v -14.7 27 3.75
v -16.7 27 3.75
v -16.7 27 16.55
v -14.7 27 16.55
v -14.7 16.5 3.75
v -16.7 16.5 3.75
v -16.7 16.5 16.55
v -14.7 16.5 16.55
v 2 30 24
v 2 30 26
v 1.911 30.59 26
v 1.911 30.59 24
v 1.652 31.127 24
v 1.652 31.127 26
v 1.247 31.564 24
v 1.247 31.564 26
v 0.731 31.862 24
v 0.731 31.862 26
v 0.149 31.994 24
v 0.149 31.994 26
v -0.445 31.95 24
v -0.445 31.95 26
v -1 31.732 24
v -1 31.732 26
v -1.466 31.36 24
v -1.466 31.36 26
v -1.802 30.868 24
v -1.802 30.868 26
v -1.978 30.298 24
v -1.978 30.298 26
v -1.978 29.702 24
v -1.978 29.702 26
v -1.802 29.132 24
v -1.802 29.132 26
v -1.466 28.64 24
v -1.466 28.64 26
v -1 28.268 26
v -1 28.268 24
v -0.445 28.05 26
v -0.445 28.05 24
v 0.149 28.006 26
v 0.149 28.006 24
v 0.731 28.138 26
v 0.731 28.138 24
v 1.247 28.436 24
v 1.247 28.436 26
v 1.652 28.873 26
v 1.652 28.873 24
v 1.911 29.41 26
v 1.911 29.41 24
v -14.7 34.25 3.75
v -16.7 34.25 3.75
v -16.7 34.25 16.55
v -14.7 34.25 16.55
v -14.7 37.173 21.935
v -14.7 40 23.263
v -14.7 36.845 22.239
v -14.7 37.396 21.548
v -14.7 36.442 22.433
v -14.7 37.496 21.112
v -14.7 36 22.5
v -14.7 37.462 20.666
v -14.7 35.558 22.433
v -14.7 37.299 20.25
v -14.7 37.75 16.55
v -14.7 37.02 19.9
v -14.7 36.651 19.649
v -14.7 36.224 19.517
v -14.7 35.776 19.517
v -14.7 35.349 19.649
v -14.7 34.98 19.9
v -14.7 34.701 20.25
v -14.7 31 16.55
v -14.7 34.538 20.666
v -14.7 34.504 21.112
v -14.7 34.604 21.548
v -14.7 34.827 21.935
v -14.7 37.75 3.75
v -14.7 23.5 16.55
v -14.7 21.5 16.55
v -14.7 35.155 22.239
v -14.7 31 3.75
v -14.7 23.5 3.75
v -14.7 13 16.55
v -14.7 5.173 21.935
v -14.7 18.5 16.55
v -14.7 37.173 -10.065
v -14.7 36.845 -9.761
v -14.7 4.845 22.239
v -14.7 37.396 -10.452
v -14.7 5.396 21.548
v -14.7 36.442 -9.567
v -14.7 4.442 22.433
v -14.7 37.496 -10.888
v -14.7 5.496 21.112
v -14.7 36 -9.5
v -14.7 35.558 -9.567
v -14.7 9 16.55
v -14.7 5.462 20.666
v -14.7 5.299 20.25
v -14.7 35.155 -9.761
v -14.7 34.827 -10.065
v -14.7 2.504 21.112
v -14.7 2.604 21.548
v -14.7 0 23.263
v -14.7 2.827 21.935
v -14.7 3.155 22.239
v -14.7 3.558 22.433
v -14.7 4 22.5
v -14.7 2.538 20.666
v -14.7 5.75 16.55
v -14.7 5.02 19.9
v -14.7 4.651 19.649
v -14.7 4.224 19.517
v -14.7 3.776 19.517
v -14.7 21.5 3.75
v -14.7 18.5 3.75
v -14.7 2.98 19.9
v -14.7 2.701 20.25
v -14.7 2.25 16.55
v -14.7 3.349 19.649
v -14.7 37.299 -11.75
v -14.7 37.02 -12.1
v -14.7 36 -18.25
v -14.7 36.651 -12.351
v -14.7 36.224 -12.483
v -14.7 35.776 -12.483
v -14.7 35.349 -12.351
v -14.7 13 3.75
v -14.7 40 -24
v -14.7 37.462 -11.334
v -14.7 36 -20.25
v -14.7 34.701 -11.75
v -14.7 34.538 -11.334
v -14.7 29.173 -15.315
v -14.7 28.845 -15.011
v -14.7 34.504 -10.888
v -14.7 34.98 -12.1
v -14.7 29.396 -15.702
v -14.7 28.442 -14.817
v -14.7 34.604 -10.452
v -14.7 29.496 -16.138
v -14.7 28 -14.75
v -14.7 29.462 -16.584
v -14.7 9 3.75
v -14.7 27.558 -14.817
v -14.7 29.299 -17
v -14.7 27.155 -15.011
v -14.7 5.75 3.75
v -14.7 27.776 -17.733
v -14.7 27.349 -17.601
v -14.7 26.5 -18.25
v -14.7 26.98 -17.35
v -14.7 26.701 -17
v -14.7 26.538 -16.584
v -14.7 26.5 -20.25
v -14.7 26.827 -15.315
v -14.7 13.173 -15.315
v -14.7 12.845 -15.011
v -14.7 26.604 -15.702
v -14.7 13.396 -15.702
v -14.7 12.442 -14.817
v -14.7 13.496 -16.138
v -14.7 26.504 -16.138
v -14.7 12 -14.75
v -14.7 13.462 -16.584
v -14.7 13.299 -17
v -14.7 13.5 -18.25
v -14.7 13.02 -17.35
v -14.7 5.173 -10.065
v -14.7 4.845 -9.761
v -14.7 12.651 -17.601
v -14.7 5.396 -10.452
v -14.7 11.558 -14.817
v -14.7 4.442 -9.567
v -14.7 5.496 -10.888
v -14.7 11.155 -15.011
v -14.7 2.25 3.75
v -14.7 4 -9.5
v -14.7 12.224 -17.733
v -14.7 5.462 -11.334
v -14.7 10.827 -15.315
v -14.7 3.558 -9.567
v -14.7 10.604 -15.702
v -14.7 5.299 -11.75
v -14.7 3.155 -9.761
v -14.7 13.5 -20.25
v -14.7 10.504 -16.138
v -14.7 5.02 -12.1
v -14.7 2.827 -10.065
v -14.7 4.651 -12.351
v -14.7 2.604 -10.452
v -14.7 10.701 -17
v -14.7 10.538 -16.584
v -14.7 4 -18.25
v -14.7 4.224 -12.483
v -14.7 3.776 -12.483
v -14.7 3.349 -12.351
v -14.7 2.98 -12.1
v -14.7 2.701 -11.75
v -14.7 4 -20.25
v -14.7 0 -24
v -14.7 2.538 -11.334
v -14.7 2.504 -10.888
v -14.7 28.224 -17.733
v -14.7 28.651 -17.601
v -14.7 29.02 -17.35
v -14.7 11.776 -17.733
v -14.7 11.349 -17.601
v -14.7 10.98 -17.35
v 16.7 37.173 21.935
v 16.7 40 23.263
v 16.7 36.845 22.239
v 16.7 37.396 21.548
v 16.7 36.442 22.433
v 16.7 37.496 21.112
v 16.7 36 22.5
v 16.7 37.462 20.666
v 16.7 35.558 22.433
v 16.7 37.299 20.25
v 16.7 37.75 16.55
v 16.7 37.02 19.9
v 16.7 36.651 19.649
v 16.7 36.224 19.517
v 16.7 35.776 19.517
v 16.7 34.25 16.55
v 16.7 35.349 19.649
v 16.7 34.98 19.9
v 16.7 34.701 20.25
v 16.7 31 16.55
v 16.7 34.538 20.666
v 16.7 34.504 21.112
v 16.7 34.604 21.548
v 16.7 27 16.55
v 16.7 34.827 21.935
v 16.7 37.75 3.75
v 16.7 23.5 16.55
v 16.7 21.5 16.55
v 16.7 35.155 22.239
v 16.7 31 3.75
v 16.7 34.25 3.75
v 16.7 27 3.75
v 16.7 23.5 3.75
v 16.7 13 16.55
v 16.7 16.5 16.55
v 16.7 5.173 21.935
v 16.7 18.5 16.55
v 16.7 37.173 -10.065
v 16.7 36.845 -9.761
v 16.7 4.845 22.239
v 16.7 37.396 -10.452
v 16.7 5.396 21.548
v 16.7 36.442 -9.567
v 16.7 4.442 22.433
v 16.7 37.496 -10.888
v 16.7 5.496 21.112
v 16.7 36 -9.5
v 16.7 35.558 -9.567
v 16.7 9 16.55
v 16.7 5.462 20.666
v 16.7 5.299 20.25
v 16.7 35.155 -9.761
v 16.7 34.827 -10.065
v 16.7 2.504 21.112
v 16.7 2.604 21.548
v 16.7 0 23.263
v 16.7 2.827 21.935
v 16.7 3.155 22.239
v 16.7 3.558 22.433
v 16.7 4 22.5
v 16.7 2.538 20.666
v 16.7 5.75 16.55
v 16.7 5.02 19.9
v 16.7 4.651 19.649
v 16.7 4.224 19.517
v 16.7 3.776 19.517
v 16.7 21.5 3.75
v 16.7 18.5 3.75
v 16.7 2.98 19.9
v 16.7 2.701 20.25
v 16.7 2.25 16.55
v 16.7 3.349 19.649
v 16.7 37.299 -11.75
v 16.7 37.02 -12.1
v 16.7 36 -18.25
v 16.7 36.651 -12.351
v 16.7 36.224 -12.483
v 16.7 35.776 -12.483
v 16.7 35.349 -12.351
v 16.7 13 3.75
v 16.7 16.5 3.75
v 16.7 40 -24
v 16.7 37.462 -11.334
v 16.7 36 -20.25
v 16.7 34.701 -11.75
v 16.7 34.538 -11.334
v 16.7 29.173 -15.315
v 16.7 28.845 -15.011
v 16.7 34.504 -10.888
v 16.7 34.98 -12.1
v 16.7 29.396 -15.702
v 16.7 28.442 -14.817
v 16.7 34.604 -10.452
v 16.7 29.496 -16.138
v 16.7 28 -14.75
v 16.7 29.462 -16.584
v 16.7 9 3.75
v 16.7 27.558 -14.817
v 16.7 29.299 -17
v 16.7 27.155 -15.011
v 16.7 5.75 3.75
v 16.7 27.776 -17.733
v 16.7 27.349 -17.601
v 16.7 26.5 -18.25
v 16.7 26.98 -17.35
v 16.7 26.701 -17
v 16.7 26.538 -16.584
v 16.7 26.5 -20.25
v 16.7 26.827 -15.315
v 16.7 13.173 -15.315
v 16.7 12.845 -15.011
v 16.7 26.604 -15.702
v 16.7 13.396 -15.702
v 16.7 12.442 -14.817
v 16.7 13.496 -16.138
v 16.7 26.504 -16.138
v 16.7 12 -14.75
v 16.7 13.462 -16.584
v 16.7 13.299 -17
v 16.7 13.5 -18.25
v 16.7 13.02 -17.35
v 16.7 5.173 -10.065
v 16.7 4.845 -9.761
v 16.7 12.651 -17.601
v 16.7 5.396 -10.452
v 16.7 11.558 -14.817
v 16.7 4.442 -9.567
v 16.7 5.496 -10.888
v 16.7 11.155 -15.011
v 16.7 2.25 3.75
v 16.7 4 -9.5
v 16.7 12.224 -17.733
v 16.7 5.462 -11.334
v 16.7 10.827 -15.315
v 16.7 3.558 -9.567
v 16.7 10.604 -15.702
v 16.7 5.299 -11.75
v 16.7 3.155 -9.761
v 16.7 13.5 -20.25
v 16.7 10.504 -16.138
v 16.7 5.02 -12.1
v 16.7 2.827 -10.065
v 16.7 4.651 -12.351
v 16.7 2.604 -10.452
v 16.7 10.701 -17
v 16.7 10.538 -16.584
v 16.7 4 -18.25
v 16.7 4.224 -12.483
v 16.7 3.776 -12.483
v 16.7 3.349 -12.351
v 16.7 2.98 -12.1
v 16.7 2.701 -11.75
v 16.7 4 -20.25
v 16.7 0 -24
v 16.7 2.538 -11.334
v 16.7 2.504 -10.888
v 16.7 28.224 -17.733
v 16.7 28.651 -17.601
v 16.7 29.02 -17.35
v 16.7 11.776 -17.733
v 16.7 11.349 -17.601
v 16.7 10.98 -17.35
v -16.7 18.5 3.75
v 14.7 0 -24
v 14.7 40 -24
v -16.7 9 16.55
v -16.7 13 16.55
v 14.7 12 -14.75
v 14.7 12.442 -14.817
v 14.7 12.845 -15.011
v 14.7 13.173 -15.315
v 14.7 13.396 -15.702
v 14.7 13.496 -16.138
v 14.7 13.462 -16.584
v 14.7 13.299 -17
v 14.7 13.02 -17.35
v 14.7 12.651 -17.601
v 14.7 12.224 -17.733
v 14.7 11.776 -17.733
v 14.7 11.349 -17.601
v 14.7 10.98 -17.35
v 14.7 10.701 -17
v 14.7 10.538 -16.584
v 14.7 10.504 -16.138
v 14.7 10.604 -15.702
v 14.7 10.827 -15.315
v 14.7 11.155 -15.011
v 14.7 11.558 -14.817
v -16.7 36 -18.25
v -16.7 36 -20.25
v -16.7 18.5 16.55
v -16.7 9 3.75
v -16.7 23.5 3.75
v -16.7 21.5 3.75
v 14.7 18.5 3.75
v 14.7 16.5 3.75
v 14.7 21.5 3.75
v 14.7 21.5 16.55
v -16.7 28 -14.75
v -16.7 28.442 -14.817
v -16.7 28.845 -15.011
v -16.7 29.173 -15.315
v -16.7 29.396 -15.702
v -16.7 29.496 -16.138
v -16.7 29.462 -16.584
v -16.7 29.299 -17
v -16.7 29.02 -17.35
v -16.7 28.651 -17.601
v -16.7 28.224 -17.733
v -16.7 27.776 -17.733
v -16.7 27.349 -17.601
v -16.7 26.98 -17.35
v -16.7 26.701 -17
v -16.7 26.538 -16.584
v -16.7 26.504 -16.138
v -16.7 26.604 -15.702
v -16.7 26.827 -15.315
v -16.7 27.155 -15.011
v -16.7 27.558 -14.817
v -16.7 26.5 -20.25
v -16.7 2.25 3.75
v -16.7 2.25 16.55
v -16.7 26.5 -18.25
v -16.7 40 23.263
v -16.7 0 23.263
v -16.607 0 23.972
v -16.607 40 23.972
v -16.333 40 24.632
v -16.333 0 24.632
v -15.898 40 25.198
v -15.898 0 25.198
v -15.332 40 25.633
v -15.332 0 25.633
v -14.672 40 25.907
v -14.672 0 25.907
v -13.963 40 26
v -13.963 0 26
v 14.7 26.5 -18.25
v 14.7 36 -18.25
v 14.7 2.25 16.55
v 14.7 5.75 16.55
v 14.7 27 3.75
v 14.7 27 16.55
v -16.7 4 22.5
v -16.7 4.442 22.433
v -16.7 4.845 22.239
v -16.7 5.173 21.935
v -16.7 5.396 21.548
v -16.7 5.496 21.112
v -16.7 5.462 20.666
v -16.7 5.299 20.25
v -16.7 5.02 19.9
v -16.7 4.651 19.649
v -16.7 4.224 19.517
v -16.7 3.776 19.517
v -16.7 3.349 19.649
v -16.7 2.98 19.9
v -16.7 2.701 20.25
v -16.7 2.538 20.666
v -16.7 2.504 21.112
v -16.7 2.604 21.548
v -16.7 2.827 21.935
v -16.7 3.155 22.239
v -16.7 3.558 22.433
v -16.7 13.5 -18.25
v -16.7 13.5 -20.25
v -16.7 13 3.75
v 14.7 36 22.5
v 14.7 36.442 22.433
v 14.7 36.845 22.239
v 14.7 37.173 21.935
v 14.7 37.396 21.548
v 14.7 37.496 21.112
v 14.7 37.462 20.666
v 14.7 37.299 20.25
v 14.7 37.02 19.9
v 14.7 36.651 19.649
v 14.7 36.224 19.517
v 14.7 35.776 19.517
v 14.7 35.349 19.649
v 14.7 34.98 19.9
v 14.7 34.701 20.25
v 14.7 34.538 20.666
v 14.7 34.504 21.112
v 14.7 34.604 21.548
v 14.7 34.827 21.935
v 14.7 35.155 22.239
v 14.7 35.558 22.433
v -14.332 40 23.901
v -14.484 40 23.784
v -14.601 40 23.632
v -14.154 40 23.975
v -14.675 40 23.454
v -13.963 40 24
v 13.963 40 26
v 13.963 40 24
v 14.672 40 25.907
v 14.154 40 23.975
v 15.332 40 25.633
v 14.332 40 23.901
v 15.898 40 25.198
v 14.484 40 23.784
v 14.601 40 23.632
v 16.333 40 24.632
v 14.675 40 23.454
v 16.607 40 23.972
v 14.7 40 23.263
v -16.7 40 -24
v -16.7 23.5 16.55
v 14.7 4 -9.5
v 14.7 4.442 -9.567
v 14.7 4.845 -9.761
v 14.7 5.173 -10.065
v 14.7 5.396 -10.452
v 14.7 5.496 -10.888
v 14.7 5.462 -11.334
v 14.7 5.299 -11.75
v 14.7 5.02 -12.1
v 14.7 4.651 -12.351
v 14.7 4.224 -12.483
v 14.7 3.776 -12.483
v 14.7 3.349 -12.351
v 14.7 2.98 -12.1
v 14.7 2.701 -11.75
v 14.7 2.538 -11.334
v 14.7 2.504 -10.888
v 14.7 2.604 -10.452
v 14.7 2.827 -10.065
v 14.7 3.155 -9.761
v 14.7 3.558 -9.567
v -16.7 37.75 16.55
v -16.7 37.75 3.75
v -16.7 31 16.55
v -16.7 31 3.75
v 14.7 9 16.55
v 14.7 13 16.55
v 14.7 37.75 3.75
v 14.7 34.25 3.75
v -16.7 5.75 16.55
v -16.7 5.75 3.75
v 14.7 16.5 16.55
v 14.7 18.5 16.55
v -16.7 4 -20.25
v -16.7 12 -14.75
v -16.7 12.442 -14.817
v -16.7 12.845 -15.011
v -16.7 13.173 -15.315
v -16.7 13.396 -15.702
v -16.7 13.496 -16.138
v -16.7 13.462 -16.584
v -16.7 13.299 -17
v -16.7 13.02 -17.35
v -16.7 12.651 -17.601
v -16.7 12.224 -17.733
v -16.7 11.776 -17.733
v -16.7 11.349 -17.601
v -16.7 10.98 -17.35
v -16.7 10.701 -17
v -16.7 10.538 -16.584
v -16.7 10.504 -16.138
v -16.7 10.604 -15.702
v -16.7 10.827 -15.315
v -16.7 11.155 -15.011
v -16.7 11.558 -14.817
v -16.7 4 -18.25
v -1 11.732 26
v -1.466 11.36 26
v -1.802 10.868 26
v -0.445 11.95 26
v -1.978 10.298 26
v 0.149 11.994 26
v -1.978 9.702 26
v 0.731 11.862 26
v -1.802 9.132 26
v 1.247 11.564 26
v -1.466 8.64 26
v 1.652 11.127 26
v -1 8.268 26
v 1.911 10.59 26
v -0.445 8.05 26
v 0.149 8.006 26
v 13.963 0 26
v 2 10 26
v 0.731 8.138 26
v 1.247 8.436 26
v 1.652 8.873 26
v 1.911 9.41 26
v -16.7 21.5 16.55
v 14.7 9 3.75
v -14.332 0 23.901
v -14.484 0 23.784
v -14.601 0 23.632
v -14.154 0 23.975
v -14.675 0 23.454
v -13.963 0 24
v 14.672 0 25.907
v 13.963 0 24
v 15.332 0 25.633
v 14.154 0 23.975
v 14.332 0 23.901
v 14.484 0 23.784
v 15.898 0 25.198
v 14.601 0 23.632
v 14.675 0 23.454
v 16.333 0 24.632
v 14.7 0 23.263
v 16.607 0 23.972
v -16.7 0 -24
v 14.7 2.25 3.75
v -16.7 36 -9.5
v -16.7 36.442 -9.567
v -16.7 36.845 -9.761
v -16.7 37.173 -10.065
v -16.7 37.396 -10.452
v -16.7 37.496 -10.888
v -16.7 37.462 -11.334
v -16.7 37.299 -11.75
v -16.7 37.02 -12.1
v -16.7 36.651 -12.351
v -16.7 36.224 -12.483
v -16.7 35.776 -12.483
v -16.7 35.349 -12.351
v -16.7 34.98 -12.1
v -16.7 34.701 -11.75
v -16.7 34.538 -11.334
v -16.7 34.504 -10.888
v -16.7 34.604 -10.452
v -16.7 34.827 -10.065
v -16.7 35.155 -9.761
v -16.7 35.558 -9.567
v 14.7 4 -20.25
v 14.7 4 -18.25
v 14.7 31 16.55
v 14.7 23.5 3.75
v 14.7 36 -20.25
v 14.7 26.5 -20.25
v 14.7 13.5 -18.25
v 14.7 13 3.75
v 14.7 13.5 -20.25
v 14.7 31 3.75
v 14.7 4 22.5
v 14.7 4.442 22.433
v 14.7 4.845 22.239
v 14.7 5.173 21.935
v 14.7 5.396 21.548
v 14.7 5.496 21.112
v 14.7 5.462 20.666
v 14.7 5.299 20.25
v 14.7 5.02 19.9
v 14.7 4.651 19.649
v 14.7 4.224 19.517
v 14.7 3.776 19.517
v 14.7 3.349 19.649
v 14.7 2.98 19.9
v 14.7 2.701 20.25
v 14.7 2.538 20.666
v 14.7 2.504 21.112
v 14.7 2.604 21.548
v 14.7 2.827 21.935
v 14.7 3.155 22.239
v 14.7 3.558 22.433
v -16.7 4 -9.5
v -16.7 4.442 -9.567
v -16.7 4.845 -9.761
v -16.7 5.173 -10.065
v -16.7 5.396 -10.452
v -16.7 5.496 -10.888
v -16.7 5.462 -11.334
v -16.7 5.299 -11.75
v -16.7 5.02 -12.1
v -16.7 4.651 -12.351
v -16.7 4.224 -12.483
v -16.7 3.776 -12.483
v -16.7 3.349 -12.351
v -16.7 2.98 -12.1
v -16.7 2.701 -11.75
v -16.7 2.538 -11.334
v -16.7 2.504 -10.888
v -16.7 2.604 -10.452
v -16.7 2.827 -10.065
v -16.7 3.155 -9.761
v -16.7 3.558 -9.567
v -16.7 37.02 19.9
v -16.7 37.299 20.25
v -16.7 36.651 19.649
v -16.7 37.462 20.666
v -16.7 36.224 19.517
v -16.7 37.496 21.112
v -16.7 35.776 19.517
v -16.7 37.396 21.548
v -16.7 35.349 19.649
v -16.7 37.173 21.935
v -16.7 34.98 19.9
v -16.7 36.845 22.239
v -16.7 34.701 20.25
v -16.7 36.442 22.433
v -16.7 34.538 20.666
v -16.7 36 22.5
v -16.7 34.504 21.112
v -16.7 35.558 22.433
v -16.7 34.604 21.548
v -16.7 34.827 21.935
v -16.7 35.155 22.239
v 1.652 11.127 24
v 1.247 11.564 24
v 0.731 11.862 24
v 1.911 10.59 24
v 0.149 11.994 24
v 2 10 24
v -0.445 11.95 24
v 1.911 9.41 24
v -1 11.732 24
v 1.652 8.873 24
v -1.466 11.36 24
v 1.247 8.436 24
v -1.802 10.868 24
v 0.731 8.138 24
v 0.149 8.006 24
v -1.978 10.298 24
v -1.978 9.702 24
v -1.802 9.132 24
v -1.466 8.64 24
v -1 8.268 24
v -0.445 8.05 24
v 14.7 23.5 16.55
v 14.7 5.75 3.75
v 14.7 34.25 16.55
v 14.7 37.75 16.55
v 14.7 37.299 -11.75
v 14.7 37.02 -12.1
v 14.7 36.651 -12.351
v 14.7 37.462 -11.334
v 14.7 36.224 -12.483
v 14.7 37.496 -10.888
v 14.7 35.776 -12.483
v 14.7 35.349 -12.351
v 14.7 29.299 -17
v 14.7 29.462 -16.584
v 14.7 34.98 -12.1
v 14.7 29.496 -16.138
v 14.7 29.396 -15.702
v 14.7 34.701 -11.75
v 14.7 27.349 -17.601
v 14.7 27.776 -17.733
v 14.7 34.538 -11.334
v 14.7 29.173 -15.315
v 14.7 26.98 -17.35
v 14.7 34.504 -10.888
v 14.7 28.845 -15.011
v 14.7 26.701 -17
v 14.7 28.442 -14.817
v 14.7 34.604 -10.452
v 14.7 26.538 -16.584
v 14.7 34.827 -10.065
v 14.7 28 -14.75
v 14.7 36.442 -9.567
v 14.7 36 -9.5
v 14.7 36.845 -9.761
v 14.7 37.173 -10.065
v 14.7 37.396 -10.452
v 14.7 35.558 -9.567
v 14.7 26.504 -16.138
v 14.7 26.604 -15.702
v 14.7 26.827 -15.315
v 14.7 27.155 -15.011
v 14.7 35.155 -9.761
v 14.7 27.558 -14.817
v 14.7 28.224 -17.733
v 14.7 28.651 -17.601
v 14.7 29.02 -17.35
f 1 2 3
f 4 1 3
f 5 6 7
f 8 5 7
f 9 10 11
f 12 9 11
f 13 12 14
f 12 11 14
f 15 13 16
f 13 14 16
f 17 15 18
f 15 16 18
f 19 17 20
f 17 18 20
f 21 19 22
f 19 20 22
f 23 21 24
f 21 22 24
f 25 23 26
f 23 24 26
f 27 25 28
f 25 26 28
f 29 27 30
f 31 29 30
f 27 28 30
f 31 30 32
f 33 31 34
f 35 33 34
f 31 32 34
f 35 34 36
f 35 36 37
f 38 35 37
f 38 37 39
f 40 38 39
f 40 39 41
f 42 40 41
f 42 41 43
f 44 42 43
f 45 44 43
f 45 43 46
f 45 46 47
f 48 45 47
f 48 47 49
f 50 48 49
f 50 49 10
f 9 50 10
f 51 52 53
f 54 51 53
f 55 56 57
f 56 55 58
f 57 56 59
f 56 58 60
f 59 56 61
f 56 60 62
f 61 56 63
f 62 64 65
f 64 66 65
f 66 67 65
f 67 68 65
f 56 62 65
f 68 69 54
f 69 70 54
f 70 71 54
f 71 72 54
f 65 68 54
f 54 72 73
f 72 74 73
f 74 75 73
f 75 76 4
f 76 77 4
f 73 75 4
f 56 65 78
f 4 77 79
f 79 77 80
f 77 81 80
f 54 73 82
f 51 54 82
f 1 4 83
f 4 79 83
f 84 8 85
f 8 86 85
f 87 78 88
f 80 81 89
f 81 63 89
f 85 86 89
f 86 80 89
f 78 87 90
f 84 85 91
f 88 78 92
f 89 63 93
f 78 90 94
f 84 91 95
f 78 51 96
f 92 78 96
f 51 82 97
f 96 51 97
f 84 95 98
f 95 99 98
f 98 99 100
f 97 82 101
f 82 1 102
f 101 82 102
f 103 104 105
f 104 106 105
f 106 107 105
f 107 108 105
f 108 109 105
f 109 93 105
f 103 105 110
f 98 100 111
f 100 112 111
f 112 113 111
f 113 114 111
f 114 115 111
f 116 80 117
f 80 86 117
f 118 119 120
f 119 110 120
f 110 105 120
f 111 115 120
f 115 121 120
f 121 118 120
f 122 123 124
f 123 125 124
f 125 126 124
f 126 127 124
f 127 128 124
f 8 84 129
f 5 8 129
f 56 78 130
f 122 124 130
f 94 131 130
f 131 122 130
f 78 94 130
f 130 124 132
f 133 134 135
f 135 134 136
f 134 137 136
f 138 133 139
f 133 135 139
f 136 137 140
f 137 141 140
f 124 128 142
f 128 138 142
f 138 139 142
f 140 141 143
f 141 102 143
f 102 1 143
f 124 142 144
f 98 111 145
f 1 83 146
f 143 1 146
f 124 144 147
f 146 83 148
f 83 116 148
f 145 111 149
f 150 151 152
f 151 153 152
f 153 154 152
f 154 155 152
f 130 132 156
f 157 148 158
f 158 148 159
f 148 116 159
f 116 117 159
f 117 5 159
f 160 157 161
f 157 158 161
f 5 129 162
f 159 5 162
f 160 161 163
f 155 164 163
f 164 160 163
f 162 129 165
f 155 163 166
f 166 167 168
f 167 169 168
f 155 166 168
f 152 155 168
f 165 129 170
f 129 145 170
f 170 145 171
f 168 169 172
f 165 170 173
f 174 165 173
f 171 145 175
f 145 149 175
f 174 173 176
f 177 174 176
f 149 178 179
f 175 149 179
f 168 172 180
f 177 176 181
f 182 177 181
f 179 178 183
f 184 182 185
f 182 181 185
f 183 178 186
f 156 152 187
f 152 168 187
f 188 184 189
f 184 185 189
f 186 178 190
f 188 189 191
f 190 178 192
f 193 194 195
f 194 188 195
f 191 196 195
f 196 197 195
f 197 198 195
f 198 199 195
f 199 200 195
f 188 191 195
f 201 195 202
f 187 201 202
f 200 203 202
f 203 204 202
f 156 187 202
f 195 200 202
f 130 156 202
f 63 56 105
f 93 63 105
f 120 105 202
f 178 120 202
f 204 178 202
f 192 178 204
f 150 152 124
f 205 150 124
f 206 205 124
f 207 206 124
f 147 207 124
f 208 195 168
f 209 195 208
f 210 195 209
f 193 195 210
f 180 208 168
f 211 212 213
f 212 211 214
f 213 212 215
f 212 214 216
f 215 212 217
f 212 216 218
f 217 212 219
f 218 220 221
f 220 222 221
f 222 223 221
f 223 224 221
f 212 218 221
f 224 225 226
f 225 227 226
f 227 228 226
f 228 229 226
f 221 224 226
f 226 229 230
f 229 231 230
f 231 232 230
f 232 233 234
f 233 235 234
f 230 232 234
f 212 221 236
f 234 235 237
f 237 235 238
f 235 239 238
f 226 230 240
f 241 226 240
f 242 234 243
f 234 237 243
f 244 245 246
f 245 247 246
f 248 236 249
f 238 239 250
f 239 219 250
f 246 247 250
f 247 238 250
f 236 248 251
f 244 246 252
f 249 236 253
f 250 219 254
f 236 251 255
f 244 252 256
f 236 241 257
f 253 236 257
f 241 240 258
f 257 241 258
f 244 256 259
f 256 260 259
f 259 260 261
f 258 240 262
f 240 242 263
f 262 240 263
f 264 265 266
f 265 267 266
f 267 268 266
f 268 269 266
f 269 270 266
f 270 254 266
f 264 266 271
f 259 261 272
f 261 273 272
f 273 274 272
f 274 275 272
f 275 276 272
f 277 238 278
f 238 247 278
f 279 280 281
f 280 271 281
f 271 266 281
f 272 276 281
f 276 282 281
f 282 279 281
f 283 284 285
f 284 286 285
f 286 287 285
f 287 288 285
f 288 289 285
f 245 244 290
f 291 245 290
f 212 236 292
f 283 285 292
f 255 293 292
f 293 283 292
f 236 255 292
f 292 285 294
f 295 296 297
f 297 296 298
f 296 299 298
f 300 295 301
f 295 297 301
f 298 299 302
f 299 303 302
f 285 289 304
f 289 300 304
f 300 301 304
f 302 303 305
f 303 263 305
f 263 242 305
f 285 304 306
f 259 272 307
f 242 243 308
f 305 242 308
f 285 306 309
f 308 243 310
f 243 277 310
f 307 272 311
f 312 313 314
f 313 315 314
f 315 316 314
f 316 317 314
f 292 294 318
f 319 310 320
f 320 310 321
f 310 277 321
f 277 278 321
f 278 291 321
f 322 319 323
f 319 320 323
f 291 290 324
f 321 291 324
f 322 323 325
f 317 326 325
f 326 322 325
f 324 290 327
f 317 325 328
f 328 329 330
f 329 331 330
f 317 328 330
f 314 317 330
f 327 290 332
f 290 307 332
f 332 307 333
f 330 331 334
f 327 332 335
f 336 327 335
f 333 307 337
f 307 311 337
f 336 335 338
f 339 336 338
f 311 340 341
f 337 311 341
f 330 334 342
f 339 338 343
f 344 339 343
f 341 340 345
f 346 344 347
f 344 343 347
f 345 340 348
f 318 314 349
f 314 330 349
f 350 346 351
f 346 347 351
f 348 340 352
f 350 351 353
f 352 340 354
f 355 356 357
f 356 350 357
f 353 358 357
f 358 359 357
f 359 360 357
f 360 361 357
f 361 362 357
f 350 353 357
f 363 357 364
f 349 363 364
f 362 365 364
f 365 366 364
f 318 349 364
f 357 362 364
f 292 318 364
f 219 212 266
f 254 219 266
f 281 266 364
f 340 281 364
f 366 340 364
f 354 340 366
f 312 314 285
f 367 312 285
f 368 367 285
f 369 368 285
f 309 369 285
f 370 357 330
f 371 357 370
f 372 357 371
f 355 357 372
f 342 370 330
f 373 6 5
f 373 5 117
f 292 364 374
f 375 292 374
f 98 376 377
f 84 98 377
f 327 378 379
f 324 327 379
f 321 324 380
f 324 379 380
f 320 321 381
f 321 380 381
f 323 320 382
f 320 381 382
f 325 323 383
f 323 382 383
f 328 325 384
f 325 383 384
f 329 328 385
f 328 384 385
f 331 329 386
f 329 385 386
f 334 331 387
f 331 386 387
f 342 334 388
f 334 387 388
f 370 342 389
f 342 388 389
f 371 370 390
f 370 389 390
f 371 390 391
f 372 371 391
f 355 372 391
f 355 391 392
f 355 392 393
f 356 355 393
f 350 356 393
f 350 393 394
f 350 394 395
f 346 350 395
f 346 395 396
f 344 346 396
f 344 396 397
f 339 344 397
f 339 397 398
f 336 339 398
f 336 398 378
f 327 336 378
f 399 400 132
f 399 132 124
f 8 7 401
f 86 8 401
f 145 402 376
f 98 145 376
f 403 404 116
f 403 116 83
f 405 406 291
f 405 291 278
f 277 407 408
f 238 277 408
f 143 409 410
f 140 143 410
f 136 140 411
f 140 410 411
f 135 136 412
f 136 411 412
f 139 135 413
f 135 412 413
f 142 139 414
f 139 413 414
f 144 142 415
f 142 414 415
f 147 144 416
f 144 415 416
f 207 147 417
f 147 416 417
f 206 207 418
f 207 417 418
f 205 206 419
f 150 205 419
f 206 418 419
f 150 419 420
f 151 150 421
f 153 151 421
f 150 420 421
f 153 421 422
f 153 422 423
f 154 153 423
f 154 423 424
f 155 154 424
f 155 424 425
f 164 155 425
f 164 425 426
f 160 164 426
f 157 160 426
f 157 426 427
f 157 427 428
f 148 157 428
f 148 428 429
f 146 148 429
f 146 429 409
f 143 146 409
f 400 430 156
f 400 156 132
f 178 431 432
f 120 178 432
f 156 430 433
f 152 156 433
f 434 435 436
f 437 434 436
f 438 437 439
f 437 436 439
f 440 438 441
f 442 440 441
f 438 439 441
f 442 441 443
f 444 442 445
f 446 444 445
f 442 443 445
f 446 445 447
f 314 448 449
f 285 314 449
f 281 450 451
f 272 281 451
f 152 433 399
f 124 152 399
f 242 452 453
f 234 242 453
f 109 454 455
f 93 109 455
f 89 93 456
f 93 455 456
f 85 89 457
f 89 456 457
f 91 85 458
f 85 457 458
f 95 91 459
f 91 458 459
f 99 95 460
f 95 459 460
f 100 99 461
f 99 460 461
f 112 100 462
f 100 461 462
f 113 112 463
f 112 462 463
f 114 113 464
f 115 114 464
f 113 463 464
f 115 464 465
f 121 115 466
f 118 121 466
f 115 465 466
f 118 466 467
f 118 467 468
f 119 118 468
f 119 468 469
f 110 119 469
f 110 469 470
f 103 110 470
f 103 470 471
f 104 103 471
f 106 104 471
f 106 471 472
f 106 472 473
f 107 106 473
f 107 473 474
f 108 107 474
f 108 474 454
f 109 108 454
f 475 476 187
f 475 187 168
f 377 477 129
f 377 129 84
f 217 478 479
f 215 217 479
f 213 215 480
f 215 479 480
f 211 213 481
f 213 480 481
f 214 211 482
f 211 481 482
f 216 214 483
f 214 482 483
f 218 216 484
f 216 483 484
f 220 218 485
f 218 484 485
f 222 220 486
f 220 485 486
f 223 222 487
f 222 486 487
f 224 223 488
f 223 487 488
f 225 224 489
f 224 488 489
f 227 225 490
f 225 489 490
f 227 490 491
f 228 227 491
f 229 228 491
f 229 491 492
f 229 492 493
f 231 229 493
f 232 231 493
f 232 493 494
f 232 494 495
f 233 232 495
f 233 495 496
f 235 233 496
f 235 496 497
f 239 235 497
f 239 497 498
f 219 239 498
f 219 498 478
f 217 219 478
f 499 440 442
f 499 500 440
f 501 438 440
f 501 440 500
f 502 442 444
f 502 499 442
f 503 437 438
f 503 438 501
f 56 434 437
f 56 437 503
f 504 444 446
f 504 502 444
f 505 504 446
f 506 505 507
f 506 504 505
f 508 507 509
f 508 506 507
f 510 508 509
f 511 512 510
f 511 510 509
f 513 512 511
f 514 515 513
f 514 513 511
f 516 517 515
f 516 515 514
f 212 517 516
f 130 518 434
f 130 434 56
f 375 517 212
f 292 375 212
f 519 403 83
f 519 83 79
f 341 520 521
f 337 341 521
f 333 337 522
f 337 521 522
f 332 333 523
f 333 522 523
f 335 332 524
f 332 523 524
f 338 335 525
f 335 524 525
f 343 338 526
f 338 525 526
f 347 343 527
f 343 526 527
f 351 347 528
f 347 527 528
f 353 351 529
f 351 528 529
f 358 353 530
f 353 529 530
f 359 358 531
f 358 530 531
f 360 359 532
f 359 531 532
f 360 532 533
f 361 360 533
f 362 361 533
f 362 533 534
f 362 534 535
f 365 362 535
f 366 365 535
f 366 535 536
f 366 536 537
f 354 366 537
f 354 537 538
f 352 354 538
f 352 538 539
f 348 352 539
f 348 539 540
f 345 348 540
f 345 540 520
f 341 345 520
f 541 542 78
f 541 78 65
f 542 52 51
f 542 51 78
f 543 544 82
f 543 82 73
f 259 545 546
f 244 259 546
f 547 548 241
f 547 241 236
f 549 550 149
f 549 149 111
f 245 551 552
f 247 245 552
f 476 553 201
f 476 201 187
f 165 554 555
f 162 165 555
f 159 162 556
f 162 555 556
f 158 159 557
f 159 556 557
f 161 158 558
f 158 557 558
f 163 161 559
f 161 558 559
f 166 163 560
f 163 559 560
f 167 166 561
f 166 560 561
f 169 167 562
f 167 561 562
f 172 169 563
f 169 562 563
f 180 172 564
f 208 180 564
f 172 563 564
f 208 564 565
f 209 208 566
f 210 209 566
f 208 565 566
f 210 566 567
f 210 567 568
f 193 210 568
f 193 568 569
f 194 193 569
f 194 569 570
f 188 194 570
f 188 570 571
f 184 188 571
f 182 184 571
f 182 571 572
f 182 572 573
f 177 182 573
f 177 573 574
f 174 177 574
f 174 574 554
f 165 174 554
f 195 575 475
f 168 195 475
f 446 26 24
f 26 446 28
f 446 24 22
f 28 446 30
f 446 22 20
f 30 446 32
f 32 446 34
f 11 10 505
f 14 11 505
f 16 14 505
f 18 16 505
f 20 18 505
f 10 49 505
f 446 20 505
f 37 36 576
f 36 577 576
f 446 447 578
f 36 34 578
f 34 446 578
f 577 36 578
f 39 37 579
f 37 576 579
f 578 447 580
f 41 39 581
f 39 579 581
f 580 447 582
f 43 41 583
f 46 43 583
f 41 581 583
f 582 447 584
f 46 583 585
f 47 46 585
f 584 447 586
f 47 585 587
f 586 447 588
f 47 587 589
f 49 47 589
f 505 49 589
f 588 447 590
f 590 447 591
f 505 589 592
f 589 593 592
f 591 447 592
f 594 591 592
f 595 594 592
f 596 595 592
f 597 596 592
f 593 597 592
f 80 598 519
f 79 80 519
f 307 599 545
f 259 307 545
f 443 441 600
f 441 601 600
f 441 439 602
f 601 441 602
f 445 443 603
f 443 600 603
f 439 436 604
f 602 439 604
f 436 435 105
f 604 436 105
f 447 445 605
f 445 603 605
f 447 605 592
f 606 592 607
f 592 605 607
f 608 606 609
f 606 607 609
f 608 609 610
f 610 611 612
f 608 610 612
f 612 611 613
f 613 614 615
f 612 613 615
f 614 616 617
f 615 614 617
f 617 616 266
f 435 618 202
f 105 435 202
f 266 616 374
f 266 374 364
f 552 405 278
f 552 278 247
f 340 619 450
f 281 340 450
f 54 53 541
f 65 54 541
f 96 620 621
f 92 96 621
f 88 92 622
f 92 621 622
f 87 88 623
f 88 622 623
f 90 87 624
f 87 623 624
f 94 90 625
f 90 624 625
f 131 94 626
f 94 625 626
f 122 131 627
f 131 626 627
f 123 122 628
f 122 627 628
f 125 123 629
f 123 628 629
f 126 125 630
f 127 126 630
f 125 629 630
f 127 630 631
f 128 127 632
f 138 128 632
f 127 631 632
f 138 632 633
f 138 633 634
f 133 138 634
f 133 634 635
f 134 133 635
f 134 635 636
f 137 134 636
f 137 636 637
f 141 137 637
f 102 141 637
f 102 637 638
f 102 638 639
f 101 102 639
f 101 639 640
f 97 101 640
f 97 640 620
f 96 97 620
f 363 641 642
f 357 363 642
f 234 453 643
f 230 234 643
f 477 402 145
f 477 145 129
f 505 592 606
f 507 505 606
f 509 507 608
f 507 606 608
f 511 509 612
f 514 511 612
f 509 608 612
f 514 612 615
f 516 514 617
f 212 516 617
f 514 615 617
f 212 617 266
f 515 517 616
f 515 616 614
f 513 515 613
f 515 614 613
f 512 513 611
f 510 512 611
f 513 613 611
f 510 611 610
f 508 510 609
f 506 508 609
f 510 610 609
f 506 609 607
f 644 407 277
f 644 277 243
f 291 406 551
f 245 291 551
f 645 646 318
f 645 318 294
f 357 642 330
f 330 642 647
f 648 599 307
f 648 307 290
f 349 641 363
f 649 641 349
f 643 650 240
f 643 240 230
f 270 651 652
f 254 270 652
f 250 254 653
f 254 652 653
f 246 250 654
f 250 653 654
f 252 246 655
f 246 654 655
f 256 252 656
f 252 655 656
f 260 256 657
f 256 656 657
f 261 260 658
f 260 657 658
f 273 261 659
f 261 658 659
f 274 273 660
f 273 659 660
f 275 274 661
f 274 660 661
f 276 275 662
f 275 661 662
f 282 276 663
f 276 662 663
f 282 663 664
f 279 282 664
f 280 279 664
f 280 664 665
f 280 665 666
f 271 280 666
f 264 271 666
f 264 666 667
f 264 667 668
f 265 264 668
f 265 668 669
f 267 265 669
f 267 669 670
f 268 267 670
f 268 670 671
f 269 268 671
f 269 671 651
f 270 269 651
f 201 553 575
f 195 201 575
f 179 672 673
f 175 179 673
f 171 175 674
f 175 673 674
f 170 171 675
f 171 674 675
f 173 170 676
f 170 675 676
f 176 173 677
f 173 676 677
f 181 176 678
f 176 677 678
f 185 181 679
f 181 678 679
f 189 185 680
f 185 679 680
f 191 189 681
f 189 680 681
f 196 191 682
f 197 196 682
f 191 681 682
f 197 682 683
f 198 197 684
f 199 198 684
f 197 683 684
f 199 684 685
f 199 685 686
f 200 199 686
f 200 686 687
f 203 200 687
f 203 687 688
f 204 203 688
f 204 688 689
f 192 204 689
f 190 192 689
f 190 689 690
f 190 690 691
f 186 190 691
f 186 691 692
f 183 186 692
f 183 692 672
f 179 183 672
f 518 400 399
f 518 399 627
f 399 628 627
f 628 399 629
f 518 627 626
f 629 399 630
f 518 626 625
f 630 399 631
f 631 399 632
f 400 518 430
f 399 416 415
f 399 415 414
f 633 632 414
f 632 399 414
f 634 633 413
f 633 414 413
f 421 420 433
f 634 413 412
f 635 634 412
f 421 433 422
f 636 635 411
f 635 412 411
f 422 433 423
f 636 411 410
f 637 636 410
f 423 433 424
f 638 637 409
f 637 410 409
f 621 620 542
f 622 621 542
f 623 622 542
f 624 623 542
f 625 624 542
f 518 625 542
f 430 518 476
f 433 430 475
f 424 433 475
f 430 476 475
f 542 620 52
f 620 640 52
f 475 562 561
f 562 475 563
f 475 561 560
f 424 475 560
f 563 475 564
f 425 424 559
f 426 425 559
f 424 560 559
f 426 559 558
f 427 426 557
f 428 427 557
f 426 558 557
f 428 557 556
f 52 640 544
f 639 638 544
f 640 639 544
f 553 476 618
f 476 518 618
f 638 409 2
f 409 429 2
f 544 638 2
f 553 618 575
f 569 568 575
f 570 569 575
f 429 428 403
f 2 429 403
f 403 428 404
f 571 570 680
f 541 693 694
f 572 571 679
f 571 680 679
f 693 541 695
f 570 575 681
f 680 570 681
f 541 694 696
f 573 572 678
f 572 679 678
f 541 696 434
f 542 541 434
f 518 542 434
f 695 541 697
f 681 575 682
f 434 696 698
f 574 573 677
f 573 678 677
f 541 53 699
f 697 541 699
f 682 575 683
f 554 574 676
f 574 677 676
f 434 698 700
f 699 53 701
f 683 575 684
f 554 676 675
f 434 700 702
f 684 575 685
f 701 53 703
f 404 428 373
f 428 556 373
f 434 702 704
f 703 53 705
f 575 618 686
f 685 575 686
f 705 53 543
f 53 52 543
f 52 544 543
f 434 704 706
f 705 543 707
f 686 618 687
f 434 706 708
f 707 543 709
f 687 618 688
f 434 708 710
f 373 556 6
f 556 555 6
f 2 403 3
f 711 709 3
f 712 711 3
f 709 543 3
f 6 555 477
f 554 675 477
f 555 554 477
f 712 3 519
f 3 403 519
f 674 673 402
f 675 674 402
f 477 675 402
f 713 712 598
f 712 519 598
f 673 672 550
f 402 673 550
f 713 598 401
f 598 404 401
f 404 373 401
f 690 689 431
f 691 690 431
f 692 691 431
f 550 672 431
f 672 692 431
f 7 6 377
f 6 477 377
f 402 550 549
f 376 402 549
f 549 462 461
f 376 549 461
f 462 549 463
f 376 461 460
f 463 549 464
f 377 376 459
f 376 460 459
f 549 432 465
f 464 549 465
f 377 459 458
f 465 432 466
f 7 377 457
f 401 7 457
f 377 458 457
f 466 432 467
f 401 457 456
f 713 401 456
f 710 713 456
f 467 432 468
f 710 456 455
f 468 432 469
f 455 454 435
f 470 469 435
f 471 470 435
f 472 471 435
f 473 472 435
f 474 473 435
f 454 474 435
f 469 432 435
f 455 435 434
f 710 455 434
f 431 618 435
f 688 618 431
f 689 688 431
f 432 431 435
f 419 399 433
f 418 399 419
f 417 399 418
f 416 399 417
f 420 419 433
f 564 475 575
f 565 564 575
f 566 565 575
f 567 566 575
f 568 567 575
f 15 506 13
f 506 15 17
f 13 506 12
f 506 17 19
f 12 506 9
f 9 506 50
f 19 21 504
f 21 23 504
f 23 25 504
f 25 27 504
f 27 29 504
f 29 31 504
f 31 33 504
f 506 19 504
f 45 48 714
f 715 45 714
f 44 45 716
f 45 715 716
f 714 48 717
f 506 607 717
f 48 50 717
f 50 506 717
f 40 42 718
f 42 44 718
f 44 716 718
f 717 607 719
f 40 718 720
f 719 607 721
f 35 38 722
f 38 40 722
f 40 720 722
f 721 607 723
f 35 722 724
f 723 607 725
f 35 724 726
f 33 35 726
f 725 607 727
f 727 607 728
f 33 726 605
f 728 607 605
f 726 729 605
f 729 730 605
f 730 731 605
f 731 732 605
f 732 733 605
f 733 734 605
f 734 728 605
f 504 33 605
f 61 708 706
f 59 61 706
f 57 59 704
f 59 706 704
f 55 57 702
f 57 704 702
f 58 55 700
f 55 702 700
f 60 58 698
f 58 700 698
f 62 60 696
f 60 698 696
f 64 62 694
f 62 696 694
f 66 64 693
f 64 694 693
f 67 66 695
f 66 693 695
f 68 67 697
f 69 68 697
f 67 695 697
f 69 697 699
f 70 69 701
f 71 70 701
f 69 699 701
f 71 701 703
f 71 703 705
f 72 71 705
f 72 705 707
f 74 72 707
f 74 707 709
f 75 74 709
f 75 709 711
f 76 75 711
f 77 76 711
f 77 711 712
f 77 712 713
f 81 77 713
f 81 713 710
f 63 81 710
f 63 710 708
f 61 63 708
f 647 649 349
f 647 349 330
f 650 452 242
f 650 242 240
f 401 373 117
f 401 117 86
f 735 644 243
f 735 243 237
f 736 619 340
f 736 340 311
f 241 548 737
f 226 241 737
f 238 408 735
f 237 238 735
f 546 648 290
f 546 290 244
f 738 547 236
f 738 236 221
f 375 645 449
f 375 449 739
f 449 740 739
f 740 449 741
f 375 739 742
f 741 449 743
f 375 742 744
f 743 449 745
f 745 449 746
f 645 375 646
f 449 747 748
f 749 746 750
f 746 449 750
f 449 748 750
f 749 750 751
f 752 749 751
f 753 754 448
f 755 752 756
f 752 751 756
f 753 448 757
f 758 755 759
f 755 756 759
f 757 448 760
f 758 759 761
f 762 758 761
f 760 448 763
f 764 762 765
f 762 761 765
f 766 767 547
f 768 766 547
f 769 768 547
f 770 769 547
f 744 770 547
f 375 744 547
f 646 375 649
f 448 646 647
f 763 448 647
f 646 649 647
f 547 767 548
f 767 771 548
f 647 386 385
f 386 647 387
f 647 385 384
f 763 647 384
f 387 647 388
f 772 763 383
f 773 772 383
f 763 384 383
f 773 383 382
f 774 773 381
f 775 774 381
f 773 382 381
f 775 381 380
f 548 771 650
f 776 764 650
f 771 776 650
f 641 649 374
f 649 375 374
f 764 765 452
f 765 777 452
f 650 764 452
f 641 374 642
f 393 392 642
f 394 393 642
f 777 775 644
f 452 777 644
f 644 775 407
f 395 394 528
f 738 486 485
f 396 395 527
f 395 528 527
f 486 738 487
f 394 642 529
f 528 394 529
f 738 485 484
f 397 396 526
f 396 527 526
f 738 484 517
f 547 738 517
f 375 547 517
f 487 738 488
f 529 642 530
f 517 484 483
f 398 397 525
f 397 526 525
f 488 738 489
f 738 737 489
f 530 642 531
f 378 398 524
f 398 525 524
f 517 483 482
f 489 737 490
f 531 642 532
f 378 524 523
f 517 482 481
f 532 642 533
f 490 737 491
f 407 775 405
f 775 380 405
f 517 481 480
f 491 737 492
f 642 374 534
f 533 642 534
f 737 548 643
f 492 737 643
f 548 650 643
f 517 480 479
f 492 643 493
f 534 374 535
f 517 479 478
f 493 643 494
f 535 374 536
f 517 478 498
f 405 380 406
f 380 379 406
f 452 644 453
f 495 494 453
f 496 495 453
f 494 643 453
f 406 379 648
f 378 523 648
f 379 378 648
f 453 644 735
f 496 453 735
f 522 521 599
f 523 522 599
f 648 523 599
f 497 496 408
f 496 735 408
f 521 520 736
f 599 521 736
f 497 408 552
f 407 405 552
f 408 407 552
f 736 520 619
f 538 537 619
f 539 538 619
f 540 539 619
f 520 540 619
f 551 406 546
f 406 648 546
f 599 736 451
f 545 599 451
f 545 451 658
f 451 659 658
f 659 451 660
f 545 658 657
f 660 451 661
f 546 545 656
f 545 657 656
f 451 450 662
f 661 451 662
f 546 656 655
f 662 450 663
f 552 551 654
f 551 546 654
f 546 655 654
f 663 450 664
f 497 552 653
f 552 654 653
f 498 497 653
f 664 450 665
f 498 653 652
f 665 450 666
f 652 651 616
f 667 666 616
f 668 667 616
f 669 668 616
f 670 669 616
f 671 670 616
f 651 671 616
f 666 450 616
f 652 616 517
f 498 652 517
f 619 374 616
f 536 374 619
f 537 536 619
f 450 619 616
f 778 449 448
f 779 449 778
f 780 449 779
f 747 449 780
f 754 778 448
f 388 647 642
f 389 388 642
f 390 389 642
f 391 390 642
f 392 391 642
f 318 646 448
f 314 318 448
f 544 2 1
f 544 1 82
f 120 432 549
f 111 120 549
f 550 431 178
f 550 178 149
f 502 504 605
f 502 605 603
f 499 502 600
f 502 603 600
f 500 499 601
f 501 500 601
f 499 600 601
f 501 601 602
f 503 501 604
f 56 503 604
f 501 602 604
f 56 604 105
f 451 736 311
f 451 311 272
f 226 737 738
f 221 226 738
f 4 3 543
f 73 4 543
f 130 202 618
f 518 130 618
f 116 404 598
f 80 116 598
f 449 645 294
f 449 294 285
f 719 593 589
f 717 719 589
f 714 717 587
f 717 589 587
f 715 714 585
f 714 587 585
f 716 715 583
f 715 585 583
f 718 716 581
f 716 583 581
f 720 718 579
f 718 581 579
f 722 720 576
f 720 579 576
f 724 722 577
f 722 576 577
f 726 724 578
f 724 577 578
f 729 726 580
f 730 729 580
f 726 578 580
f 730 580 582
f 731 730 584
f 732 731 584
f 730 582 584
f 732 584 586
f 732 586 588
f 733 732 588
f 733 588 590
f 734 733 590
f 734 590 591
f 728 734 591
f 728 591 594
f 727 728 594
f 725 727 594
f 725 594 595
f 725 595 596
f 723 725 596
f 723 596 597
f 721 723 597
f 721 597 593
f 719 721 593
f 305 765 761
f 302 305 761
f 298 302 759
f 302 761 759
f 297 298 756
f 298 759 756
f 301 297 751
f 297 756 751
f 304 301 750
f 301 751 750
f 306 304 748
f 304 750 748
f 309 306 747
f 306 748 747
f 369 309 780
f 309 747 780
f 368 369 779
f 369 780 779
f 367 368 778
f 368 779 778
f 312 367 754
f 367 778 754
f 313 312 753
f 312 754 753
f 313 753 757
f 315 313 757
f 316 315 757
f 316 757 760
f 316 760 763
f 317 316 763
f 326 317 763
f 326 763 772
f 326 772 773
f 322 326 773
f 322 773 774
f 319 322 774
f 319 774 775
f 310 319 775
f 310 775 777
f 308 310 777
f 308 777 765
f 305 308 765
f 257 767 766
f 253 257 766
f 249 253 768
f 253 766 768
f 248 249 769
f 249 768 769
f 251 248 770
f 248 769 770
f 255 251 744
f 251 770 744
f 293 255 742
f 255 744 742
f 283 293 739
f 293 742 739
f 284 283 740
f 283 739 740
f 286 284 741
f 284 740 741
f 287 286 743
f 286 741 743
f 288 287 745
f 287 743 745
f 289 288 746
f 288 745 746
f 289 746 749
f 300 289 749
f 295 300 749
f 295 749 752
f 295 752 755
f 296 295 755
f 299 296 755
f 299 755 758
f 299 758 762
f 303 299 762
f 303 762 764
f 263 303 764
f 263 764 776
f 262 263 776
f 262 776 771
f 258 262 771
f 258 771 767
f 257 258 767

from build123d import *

# Parameters (mm, degrees)
BASE_FLANGE1_DEPTH = 40
SKETCH2_R          = 1.5
SKETCH2_W          = 12.8
SKETCH2_H          = 3.5
SKETCH2_H_2        = 2
SKETCH2_H_3        = 4
SKETCH2_W_2        = 2
SKETCH2_H_4        = 9.5
CUT_EXTRUDE1_DEPTH = 33.4
CUT_EXTRUDE2_REACH = 68.173
SKETCH4_R          = 2


# Sheet-metal steps are written as plain solids
with BuildPart() as part:
    # Sketch1 → Base-Flange1 (new body)
    with BuildSketch(Plane(origin=(0, 0, 0), x_dir=(1, 0, 0), z_dir=(0, 1, 0))):
        with BuildLine():
            Line((14.7, 24), (14.7, -23.2634))
            ThreePointArc((14.7, -23.2634), (14.484254855, -23.784254855), (13.9634, -24))
            Line((13.9634, -24), (-13.9634, -24))
            ThreePointArc((-13.9634, -24), (-14.484254855, -23.784254855), (-14.7, -23.2634))
            Line((-14.7, -23.2634), (-14.7, 24))
            Line((-14.7, 24), (-16.7, 24))
            Line((-16.7, 24), (-16.7, -23.2634))
            ThreePointArc((-16.7, -23.2634), (-15.898468417, -25.198468417), (-13.9634, -26))
            Line((-13.9634, -26), (13.9634, -26))
            ThreePointArc((13.9634, -26), (15.898468417, -25.198468417), (16.7, -23.2634))
            Line((16.7, -23.2634), (16.7, 24))
            Line((16.7, 24), (14.7, 24))
        make_face()
    extrude(amount=BASE_FLANGE1_DEPTH)

    # Sketch2 → Cut-Extrude1 (cut)
    with BuildSketch(Plane.ZY.offset(16.7)):
        with Locations((-16.25, 12)):
            Circle(SKETCH2_R)
        with Locations((-16.25, 28)):
            Circle(SKETCH2_R)
        with Locations((21, 4)):
            Circle(SKETCH2_R)
        with Locations((21, 36)):
            Circle(SKETCH2_R)
        with Locations((-11, 4)):
            Circle(SKETCH2_R)
        with Locations((-11, 36)):
            Circle(SKETCH2_R)
        with Locations((10.15, 36)):
            Rectangle(SKETCH2_W, SKETCH2_H)
        with Locations((10.15, 17.5)):
            Rectangle(SKETCH2_W, SKETCH2_H_2)
        with Locations((10.15, 11)):
            Rectangle(SKETCH2_W, SKETCH2_H_3)
        with Locations((10.15, 29)):
            Rectangle(SKETCH2_W, SKETCH2_H_3)
        with Locations((10.15, 4)):
            Rectangle(SKETCH2_W, SKETCH2_H)
        with Locations((10.15, 22.5)):
            Rectangle(SKETCH2_W, SKETCH2_H_2)
        with Locations((-19.25, 8.75)):
            Rectangle(SKETCH2_W_2, SKETCH2_H_4)
        with Locations((-19.25, 31.25)):
            Rectangle(SKETCH2_W_2, SKETCH2_H_4)
    extrude(amount=-CUT_EXTRUDE1_DEPTH, mode=Mode.SUBTRACT)

    # Sketch4 → Cut-Extrude2 (cut, up to next)
    with BuildSketch(Plane.XY.offset(26), mode=Mode.PRIVATE) as cut_extrude2_sk1:
        with Locations((0, 10)):
            Circle(SKETCH4_R)
    cut_extrude2_tool1 = extrude(cut_extrude2_sk1.sketch, amount=-CUT_EXTRUDE2_REACH, mode=Mode.PRIVATE) & part.part
    # Sketch4 → Cut-Extrude2 (cut, up to next)
    with BuildSketch(Plane.XY.offset(26), mode=Mode.PRIVATE) as cut_extrude2_sk2:
        with Locations((0, 30)):
            Circle(SKETCH4_R)
    cut_extrude2_tool2 = extrude(cut_extrude2_sk2.sketch, amount=-CUT_EXTRUDE2_REACH, mode=Mode.PRIVATE) & part.part
    add(cut_extrude2_tool1.solids().sort_by_distance((0, 10, 26))[0], mode=Mode.SUBTRACT)
    add(cut_extrude2_tool2.solids().sort_by_distance((0, 30, 26))[0], mode=Mode.SUBTRACT)


solid = part.part
